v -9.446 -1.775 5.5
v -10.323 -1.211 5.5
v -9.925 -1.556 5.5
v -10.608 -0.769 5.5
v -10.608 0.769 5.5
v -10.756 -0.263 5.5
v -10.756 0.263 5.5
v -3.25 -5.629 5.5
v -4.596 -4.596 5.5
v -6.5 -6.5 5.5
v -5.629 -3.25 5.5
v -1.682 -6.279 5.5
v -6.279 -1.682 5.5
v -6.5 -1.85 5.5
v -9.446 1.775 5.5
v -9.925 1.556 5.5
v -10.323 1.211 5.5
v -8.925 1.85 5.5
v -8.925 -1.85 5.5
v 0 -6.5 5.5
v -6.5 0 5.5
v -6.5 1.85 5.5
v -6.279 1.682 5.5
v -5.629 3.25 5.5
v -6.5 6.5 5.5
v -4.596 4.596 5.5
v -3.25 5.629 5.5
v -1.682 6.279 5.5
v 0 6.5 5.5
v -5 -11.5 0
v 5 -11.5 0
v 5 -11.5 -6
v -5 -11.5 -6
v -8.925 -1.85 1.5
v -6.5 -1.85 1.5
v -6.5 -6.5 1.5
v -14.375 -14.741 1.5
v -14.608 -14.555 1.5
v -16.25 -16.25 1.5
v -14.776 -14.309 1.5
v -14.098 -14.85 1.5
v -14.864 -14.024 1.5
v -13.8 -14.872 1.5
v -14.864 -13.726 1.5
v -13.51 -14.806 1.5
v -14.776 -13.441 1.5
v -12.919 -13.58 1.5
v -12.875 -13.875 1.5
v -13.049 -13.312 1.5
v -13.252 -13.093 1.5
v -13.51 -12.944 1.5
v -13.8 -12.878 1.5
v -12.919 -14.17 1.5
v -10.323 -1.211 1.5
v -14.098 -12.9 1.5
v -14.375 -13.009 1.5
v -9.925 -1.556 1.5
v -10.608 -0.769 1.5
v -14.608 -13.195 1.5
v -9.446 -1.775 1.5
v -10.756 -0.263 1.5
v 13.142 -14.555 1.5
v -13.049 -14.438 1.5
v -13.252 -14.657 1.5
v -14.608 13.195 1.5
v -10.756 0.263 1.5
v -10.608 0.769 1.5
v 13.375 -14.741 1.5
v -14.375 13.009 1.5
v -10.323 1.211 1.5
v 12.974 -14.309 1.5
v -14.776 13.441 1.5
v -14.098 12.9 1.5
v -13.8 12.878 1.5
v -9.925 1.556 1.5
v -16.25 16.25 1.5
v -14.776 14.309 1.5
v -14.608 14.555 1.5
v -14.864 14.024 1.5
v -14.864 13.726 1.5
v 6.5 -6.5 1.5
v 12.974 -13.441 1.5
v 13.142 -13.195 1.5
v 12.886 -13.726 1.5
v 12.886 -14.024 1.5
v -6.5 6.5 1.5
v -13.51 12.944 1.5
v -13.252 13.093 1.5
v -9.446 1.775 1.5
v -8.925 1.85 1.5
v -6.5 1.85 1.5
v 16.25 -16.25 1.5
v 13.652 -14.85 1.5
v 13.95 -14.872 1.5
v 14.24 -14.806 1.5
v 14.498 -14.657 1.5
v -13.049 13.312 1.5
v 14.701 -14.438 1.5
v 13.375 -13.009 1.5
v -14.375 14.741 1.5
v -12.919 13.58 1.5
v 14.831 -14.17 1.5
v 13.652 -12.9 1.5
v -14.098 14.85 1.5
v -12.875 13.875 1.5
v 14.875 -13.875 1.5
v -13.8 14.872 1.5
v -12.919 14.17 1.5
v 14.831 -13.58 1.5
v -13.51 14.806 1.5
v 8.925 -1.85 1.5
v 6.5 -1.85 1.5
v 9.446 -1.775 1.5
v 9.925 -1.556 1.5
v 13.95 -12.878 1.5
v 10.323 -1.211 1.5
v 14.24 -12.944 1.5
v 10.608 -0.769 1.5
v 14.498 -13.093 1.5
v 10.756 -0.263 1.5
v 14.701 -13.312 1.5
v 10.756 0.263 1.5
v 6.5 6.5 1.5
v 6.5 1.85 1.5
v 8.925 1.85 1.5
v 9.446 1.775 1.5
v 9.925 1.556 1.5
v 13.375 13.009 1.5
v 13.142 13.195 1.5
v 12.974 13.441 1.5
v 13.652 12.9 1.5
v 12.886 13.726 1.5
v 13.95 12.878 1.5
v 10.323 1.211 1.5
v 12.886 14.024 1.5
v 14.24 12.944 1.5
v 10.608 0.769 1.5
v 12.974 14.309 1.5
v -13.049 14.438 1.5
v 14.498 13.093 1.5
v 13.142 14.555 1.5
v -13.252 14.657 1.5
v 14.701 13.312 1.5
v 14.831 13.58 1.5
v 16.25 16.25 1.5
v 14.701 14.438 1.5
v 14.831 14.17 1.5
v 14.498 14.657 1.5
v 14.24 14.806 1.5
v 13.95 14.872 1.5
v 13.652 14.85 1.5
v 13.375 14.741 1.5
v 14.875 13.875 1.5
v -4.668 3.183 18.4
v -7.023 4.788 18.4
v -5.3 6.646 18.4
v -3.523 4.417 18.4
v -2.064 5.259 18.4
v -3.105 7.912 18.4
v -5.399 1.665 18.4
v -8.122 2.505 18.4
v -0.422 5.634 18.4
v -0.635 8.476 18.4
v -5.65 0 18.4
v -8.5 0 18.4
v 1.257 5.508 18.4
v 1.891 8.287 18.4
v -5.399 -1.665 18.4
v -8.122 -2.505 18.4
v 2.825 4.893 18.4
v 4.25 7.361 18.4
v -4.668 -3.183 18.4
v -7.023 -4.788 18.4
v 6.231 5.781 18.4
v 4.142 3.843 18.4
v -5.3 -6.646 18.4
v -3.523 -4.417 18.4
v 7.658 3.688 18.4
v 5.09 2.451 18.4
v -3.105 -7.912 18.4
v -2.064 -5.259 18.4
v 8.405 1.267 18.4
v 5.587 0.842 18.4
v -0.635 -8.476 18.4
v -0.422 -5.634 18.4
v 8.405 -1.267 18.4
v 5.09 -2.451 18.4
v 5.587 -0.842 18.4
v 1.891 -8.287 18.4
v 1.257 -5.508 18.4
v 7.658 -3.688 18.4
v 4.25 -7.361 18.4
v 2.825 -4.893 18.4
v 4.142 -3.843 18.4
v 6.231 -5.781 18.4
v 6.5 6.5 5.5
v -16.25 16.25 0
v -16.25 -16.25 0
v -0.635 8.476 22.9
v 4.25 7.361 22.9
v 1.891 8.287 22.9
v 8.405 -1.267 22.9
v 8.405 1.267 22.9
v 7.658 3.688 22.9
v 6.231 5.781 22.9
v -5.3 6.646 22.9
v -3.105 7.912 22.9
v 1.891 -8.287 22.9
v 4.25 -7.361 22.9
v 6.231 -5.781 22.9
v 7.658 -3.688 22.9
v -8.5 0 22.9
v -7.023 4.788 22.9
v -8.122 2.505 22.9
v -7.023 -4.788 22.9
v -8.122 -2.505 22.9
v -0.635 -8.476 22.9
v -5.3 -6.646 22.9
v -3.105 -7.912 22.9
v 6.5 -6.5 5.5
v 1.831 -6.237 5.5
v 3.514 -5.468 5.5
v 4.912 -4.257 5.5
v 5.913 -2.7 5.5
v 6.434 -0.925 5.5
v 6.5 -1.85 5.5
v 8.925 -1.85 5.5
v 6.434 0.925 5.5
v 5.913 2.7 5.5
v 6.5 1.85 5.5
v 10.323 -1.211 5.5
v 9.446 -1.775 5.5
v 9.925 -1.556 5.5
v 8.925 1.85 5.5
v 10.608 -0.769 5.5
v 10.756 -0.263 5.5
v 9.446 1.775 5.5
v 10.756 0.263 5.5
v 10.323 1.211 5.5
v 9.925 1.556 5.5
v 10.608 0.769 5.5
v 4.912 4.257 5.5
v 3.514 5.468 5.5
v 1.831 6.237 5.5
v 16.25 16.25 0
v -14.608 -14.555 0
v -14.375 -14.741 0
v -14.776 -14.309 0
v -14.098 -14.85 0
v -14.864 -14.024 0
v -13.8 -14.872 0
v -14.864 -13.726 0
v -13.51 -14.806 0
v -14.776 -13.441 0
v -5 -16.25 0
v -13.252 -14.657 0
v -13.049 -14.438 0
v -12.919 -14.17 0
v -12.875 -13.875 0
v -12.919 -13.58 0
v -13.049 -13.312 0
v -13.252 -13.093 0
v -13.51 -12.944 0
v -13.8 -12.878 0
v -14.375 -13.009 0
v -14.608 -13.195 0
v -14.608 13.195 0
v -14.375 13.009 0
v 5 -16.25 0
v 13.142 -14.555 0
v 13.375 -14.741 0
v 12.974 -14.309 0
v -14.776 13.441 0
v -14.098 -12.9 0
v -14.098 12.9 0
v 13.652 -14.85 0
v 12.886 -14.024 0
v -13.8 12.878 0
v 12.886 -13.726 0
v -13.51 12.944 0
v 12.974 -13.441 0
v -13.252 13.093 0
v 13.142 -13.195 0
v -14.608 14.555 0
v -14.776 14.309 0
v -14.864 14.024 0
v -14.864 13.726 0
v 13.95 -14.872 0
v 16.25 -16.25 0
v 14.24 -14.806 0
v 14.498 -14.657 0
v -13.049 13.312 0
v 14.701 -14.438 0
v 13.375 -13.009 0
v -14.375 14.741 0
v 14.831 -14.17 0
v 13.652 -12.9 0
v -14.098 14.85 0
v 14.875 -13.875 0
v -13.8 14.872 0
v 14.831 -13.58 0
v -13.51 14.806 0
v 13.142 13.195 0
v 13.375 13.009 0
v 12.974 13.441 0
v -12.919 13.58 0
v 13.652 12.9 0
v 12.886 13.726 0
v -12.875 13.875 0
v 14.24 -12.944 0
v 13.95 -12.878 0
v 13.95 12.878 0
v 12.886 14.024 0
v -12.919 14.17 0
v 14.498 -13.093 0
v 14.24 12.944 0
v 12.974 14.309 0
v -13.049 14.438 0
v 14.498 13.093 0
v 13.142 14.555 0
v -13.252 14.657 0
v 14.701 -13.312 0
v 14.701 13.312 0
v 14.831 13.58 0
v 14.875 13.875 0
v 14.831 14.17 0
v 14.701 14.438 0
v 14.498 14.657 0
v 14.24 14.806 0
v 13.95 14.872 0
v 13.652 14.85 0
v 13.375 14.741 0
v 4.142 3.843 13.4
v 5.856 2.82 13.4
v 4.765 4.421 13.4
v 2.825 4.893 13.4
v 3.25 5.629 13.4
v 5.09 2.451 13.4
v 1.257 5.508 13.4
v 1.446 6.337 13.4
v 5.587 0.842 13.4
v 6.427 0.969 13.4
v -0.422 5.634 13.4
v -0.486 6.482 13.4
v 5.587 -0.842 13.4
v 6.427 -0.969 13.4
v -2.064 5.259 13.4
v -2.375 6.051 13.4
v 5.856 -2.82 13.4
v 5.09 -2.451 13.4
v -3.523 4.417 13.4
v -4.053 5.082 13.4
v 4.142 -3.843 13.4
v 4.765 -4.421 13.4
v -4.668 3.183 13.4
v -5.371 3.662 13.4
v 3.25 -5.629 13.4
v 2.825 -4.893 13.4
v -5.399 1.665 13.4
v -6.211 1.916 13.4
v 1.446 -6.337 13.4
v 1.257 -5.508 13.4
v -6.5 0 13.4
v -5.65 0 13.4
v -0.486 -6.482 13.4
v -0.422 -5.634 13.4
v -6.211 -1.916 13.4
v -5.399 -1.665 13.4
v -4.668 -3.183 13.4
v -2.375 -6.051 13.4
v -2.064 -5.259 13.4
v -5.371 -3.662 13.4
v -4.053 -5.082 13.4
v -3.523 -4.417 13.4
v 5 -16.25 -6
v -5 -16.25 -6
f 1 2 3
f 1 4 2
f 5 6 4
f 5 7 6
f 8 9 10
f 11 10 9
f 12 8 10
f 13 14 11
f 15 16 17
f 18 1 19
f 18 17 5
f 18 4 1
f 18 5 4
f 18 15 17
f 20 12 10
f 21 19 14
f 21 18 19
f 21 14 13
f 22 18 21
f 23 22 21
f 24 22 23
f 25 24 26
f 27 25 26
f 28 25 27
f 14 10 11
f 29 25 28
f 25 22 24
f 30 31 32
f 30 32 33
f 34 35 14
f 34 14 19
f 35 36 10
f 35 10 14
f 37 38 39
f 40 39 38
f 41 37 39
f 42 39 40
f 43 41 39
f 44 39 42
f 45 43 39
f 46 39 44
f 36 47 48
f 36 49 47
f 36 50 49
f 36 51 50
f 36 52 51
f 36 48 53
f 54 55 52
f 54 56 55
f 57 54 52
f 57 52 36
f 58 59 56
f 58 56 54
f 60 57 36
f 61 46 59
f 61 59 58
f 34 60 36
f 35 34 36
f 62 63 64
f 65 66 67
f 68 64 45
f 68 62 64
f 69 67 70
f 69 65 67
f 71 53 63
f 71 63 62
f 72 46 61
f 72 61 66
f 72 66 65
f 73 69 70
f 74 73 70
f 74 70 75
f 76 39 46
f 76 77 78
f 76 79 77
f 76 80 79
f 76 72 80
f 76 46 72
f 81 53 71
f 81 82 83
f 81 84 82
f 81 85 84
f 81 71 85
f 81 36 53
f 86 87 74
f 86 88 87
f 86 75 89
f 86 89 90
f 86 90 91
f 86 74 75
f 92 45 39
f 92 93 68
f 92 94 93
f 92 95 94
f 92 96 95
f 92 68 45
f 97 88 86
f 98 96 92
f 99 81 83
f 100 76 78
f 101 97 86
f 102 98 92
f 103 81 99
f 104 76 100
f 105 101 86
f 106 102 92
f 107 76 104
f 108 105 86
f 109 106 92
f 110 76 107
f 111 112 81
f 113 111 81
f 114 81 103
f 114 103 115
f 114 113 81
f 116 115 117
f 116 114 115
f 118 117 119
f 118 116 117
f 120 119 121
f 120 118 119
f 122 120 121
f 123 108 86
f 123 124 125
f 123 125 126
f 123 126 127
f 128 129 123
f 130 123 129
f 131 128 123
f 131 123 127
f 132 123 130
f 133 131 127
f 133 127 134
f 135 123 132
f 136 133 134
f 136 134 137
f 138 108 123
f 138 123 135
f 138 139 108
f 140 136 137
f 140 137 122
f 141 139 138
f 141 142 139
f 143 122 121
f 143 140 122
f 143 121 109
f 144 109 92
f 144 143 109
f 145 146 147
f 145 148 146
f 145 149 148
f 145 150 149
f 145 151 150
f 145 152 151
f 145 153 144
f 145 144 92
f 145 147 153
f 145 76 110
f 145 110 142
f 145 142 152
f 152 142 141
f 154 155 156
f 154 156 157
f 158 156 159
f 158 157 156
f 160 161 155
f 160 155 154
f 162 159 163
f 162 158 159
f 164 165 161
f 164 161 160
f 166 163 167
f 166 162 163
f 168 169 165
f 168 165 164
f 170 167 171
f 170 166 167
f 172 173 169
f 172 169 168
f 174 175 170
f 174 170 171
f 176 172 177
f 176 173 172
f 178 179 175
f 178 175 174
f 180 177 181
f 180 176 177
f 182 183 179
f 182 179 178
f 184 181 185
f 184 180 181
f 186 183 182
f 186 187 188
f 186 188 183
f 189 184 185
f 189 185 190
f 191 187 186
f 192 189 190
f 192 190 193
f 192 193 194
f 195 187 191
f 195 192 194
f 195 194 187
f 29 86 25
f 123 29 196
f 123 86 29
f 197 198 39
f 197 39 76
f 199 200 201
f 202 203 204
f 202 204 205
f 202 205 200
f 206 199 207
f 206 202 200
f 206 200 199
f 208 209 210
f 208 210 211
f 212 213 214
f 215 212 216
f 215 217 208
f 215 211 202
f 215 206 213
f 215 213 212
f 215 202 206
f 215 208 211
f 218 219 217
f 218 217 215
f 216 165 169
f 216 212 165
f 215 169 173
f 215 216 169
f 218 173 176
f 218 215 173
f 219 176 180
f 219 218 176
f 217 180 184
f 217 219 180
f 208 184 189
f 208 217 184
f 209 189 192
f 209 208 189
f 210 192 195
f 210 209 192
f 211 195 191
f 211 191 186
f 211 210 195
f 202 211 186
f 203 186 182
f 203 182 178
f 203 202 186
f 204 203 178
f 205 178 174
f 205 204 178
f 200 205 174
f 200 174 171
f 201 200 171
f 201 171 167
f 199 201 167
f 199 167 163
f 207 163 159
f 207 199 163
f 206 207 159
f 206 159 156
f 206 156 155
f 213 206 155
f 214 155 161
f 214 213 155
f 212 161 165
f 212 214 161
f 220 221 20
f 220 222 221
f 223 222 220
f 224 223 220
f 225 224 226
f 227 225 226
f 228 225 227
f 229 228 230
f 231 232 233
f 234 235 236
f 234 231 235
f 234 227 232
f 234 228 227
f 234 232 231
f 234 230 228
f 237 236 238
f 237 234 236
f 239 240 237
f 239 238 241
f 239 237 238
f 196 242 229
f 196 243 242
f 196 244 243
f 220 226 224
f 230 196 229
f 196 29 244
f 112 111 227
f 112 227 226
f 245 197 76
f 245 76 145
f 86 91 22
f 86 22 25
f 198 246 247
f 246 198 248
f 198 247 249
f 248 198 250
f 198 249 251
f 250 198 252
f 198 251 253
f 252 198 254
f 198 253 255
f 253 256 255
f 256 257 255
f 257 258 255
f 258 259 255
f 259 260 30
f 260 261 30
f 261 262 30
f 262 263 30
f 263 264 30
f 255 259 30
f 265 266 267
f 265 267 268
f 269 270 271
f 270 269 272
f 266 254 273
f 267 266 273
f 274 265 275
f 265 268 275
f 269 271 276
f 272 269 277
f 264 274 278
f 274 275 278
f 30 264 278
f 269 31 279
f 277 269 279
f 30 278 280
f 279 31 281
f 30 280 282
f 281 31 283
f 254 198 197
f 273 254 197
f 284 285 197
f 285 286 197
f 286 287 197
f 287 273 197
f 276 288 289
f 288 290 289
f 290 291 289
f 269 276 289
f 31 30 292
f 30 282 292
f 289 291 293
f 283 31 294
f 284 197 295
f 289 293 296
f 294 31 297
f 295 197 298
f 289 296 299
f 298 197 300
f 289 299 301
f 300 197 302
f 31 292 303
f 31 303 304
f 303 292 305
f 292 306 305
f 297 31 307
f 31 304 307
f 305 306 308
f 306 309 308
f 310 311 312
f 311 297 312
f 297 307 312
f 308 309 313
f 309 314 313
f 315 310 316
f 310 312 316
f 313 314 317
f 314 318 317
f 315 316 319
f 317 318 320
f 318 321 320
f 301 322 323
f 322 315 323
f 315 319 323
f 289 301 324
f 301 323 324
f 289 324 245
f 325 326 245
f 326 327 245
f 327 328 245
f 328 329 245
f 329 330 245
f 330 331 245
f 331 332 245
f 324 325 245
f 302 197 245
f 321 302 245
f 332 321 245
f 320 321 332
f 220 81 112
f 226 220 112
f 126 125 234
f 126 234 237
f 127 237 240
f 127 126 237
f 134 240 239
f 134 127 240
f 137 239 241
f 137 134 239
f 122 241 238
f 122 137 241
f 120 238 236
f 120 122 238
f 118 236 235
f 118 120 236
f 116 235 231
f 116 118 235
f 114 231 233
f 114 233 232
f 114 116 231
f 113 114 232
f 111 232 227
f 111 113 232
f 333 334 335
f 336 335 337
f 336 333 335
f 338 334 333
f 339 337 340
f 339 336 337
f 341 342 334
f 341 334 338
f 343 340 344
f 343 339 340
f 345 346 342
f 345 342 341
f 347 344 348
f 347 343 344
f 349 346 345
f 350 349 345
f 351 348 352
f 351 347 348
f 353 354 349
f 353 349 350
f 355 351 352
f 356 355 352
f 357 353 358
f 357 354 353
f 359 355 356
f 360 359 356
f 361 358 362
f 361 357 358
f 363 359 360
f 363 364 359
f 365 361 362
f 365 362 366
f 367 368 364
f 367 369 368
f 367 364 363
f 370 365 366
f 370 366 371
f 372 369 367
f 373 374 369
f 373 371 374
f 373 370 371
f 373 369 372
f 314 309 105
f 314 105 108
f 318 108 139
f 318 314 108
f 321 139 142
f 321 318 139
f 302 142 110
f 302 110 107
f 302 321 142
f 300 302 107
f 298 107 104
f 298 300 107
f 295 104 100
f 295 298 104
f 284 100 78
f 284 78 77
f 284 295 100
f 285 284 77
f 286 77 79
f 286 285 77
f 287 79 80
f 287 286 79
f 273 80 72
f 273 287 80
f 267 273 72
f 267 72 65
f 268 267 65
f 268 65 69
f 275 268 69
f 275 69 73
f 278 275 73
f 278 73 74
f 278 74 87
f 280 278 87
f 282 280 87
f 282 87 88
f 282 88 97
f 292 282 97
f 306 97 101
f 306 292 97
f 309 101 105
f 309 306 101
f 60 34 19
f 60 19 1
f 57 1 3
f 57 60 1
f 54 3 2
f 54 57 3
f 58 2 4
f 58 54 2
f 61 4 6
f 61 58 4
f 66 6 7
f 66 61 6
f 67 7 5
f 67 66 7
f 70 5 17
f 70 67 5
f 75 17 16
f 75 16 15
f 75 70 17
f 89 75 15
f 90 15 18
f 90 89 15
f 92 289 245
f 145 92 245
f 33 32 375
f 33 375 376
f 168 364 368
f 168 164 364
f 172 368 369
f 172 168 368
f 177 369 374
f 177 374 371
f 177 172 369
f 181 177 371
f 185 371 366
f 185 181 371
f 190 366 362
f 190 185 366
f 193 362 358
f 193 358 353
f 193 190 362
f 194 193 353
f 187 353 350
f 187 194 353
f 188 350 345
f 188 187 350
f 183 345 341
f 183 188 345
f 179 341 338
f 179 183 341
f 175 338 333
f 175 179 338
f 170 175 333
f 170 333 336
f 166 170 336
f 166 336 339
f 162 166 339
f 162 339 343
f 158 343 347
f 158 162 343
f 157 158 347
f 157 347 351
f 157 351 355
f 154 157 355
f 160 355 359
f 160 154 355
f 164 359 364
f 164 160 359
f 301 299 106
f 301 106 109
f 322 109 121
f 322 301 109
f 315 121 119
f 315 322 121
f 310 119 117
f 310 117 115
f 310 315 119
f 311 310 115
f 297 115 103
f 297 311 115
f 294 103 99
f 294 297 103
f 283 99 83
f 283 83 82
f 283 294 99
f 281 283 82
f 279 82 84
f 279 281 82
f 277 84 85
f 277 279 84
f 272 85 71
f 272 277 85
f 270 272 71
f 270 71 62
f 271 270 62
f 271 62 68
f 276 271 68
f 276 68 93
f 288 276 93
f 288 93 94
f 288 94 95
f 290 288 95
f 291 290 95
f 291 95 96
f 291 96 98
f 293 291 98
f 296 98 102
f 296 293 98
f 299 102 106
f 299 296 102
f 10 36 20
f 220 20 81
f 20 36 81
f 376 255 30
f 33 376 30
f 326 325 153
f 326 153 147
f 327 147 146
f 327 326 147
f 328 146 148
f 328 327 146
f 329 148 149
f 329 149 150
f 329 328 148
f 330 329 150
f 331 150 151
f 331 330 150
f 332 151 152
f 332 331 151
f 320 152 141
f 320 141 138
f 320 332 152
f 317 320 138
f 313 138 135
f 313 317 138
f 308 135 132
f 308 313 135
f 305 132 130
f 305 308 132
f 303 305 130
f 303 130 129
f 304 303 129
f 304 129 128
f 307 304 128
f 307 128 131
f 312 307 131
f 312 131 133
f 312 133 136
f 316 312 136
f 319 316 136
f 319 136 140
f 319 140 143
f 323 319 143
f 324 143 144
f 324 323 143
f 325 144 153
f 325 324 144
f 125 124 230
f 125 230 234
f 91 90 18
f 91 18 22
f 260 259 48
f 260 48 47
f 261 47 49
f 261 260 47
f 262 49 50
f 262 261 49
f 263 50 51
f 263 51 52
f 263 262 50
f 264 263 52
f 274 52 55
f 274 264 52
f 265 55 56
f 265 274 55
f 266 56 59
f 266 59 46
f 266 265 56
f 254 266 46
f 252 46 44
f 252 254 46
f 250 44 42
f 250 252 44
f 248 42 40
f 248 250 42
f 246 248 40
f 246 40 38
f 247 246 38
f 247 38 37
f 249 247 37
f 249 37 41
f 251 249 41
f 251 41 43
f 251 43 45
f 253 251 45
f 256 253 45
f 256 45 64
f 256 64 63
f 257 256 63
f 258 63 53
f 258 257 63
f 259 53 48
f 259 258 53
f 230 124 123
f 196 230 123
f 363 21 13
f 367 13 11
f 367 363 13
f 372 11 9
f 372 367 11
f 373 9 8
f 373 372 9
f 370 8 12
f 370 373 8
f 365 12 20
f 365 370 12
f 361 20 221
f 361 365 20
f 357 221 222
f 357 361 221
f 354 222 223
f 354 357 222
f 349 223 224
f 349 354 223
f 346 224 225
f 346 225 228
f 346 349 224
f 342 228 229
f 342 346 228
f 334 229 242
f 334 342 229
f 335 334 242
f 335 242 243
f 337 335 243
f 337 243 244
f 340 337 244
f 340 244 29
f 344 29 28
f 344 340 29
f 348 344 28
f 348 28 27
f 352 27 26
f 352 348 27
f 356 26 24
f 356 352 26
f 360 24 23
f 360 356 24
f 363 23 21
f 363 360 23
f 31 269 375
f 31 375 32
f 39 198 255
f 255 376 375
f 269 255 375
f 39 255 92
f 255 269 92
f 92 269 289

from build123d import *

# Parameters (mm, degrees)
SKETCH2_W           = 32.5
SKETCH2_H           = 32.5
SKETCH2_R           = 1
BOSS_EXTRUDE1_DEPTH = 1.5
SKETCH4_W           = 13
SKETCH4_H           = 13
BOSS_EXTRUDE2_DEPTH = 4
SKETCH6_W           = 10
SKETCH6_H           = 4.75
BOSS_EXTRUDE3_DEPTH = 6


with BuildPart() as part:
    # Sketch2 → Boss-Extrude1 (new body)
    with BuildSketch(Plane.XY):
        Rectangle(SKETCH2_W, SKETCH2_H)
        with Locations((13.875, 13.875)):
            Circle(SKETCH2_R, mode=Mode.SUBTRACT)
        with Locations((13.875, -13.875)):
            Circle(SKETCH2_R, mode=Mode.SUBTRACT)
        with Locations((-13.875, -13.875)):
            Circle(SKETCH2_R, mode=Mode.SUBTRACT)
        with Locations((-13.875, 13.875)):
            Circle(SKETCH2_R, mode=Mode.SUBTRACT)
    extrude(amount=BOSS_EXTRUDE1_DEPTH)

    # Sketch4 → Boss-Extrude2 (add)
    with BuildSketch(Plane.XY.offset(1.5)):
        Rectangle(SKETCH4_W, SKETCH4_H)
        with BuildLine():
            Line((8.925, -1.85), (-8.925, -1.85))
            ThreePointArc((-8.925, -1.85), (-10.775, 0), (-8.925, 1.85))
            Line((-8.925, 1.85), (8.925, 1.85))
            ThreePointArc((8.925, 1.85), (10.775, 0), (8.925, -1.85))
        make_face()
    extrude(amount=BOSS_EXTRUDE2_DEPTH)

    # Sketch5 → Revolve1 (revolve)
    with BuildSketch(Plane(origin=(0, 0, 0), x_dir=(1, 0, 0), z_dir=(0, 1, 0)), mode=Mode.PRIVATE) as revolve1_sk:
        Polygon((0, -5.5), (6.5, -5.5), (6.5, -13.4), (5.65, -13.4), (5.65, -18.4), (8.5, -18.4), (8.5, -22.9), (0, -22.9), align=None)
    revolve(revolve1_sk.sketch.rotate(Axis((0, 0, 0), (0, 0, 1)), 180), axis=Axis((0, 0, 0), (0, 0, 1)))

    # Sketch6 → Boss-Extrude3 (add)
    with BuildSketch(Plane(origin=(0, 0, 0), x_dir=(-1, 0, 0), z_dir=(0, 0, -1))):
        with Locations((0, -13.875)):
            Rectangle(SKETCH6_W, SKETCH6_H)
    extrude(amount=BOSS_EXTRUDE3_DEPTH)


solid = part.part
